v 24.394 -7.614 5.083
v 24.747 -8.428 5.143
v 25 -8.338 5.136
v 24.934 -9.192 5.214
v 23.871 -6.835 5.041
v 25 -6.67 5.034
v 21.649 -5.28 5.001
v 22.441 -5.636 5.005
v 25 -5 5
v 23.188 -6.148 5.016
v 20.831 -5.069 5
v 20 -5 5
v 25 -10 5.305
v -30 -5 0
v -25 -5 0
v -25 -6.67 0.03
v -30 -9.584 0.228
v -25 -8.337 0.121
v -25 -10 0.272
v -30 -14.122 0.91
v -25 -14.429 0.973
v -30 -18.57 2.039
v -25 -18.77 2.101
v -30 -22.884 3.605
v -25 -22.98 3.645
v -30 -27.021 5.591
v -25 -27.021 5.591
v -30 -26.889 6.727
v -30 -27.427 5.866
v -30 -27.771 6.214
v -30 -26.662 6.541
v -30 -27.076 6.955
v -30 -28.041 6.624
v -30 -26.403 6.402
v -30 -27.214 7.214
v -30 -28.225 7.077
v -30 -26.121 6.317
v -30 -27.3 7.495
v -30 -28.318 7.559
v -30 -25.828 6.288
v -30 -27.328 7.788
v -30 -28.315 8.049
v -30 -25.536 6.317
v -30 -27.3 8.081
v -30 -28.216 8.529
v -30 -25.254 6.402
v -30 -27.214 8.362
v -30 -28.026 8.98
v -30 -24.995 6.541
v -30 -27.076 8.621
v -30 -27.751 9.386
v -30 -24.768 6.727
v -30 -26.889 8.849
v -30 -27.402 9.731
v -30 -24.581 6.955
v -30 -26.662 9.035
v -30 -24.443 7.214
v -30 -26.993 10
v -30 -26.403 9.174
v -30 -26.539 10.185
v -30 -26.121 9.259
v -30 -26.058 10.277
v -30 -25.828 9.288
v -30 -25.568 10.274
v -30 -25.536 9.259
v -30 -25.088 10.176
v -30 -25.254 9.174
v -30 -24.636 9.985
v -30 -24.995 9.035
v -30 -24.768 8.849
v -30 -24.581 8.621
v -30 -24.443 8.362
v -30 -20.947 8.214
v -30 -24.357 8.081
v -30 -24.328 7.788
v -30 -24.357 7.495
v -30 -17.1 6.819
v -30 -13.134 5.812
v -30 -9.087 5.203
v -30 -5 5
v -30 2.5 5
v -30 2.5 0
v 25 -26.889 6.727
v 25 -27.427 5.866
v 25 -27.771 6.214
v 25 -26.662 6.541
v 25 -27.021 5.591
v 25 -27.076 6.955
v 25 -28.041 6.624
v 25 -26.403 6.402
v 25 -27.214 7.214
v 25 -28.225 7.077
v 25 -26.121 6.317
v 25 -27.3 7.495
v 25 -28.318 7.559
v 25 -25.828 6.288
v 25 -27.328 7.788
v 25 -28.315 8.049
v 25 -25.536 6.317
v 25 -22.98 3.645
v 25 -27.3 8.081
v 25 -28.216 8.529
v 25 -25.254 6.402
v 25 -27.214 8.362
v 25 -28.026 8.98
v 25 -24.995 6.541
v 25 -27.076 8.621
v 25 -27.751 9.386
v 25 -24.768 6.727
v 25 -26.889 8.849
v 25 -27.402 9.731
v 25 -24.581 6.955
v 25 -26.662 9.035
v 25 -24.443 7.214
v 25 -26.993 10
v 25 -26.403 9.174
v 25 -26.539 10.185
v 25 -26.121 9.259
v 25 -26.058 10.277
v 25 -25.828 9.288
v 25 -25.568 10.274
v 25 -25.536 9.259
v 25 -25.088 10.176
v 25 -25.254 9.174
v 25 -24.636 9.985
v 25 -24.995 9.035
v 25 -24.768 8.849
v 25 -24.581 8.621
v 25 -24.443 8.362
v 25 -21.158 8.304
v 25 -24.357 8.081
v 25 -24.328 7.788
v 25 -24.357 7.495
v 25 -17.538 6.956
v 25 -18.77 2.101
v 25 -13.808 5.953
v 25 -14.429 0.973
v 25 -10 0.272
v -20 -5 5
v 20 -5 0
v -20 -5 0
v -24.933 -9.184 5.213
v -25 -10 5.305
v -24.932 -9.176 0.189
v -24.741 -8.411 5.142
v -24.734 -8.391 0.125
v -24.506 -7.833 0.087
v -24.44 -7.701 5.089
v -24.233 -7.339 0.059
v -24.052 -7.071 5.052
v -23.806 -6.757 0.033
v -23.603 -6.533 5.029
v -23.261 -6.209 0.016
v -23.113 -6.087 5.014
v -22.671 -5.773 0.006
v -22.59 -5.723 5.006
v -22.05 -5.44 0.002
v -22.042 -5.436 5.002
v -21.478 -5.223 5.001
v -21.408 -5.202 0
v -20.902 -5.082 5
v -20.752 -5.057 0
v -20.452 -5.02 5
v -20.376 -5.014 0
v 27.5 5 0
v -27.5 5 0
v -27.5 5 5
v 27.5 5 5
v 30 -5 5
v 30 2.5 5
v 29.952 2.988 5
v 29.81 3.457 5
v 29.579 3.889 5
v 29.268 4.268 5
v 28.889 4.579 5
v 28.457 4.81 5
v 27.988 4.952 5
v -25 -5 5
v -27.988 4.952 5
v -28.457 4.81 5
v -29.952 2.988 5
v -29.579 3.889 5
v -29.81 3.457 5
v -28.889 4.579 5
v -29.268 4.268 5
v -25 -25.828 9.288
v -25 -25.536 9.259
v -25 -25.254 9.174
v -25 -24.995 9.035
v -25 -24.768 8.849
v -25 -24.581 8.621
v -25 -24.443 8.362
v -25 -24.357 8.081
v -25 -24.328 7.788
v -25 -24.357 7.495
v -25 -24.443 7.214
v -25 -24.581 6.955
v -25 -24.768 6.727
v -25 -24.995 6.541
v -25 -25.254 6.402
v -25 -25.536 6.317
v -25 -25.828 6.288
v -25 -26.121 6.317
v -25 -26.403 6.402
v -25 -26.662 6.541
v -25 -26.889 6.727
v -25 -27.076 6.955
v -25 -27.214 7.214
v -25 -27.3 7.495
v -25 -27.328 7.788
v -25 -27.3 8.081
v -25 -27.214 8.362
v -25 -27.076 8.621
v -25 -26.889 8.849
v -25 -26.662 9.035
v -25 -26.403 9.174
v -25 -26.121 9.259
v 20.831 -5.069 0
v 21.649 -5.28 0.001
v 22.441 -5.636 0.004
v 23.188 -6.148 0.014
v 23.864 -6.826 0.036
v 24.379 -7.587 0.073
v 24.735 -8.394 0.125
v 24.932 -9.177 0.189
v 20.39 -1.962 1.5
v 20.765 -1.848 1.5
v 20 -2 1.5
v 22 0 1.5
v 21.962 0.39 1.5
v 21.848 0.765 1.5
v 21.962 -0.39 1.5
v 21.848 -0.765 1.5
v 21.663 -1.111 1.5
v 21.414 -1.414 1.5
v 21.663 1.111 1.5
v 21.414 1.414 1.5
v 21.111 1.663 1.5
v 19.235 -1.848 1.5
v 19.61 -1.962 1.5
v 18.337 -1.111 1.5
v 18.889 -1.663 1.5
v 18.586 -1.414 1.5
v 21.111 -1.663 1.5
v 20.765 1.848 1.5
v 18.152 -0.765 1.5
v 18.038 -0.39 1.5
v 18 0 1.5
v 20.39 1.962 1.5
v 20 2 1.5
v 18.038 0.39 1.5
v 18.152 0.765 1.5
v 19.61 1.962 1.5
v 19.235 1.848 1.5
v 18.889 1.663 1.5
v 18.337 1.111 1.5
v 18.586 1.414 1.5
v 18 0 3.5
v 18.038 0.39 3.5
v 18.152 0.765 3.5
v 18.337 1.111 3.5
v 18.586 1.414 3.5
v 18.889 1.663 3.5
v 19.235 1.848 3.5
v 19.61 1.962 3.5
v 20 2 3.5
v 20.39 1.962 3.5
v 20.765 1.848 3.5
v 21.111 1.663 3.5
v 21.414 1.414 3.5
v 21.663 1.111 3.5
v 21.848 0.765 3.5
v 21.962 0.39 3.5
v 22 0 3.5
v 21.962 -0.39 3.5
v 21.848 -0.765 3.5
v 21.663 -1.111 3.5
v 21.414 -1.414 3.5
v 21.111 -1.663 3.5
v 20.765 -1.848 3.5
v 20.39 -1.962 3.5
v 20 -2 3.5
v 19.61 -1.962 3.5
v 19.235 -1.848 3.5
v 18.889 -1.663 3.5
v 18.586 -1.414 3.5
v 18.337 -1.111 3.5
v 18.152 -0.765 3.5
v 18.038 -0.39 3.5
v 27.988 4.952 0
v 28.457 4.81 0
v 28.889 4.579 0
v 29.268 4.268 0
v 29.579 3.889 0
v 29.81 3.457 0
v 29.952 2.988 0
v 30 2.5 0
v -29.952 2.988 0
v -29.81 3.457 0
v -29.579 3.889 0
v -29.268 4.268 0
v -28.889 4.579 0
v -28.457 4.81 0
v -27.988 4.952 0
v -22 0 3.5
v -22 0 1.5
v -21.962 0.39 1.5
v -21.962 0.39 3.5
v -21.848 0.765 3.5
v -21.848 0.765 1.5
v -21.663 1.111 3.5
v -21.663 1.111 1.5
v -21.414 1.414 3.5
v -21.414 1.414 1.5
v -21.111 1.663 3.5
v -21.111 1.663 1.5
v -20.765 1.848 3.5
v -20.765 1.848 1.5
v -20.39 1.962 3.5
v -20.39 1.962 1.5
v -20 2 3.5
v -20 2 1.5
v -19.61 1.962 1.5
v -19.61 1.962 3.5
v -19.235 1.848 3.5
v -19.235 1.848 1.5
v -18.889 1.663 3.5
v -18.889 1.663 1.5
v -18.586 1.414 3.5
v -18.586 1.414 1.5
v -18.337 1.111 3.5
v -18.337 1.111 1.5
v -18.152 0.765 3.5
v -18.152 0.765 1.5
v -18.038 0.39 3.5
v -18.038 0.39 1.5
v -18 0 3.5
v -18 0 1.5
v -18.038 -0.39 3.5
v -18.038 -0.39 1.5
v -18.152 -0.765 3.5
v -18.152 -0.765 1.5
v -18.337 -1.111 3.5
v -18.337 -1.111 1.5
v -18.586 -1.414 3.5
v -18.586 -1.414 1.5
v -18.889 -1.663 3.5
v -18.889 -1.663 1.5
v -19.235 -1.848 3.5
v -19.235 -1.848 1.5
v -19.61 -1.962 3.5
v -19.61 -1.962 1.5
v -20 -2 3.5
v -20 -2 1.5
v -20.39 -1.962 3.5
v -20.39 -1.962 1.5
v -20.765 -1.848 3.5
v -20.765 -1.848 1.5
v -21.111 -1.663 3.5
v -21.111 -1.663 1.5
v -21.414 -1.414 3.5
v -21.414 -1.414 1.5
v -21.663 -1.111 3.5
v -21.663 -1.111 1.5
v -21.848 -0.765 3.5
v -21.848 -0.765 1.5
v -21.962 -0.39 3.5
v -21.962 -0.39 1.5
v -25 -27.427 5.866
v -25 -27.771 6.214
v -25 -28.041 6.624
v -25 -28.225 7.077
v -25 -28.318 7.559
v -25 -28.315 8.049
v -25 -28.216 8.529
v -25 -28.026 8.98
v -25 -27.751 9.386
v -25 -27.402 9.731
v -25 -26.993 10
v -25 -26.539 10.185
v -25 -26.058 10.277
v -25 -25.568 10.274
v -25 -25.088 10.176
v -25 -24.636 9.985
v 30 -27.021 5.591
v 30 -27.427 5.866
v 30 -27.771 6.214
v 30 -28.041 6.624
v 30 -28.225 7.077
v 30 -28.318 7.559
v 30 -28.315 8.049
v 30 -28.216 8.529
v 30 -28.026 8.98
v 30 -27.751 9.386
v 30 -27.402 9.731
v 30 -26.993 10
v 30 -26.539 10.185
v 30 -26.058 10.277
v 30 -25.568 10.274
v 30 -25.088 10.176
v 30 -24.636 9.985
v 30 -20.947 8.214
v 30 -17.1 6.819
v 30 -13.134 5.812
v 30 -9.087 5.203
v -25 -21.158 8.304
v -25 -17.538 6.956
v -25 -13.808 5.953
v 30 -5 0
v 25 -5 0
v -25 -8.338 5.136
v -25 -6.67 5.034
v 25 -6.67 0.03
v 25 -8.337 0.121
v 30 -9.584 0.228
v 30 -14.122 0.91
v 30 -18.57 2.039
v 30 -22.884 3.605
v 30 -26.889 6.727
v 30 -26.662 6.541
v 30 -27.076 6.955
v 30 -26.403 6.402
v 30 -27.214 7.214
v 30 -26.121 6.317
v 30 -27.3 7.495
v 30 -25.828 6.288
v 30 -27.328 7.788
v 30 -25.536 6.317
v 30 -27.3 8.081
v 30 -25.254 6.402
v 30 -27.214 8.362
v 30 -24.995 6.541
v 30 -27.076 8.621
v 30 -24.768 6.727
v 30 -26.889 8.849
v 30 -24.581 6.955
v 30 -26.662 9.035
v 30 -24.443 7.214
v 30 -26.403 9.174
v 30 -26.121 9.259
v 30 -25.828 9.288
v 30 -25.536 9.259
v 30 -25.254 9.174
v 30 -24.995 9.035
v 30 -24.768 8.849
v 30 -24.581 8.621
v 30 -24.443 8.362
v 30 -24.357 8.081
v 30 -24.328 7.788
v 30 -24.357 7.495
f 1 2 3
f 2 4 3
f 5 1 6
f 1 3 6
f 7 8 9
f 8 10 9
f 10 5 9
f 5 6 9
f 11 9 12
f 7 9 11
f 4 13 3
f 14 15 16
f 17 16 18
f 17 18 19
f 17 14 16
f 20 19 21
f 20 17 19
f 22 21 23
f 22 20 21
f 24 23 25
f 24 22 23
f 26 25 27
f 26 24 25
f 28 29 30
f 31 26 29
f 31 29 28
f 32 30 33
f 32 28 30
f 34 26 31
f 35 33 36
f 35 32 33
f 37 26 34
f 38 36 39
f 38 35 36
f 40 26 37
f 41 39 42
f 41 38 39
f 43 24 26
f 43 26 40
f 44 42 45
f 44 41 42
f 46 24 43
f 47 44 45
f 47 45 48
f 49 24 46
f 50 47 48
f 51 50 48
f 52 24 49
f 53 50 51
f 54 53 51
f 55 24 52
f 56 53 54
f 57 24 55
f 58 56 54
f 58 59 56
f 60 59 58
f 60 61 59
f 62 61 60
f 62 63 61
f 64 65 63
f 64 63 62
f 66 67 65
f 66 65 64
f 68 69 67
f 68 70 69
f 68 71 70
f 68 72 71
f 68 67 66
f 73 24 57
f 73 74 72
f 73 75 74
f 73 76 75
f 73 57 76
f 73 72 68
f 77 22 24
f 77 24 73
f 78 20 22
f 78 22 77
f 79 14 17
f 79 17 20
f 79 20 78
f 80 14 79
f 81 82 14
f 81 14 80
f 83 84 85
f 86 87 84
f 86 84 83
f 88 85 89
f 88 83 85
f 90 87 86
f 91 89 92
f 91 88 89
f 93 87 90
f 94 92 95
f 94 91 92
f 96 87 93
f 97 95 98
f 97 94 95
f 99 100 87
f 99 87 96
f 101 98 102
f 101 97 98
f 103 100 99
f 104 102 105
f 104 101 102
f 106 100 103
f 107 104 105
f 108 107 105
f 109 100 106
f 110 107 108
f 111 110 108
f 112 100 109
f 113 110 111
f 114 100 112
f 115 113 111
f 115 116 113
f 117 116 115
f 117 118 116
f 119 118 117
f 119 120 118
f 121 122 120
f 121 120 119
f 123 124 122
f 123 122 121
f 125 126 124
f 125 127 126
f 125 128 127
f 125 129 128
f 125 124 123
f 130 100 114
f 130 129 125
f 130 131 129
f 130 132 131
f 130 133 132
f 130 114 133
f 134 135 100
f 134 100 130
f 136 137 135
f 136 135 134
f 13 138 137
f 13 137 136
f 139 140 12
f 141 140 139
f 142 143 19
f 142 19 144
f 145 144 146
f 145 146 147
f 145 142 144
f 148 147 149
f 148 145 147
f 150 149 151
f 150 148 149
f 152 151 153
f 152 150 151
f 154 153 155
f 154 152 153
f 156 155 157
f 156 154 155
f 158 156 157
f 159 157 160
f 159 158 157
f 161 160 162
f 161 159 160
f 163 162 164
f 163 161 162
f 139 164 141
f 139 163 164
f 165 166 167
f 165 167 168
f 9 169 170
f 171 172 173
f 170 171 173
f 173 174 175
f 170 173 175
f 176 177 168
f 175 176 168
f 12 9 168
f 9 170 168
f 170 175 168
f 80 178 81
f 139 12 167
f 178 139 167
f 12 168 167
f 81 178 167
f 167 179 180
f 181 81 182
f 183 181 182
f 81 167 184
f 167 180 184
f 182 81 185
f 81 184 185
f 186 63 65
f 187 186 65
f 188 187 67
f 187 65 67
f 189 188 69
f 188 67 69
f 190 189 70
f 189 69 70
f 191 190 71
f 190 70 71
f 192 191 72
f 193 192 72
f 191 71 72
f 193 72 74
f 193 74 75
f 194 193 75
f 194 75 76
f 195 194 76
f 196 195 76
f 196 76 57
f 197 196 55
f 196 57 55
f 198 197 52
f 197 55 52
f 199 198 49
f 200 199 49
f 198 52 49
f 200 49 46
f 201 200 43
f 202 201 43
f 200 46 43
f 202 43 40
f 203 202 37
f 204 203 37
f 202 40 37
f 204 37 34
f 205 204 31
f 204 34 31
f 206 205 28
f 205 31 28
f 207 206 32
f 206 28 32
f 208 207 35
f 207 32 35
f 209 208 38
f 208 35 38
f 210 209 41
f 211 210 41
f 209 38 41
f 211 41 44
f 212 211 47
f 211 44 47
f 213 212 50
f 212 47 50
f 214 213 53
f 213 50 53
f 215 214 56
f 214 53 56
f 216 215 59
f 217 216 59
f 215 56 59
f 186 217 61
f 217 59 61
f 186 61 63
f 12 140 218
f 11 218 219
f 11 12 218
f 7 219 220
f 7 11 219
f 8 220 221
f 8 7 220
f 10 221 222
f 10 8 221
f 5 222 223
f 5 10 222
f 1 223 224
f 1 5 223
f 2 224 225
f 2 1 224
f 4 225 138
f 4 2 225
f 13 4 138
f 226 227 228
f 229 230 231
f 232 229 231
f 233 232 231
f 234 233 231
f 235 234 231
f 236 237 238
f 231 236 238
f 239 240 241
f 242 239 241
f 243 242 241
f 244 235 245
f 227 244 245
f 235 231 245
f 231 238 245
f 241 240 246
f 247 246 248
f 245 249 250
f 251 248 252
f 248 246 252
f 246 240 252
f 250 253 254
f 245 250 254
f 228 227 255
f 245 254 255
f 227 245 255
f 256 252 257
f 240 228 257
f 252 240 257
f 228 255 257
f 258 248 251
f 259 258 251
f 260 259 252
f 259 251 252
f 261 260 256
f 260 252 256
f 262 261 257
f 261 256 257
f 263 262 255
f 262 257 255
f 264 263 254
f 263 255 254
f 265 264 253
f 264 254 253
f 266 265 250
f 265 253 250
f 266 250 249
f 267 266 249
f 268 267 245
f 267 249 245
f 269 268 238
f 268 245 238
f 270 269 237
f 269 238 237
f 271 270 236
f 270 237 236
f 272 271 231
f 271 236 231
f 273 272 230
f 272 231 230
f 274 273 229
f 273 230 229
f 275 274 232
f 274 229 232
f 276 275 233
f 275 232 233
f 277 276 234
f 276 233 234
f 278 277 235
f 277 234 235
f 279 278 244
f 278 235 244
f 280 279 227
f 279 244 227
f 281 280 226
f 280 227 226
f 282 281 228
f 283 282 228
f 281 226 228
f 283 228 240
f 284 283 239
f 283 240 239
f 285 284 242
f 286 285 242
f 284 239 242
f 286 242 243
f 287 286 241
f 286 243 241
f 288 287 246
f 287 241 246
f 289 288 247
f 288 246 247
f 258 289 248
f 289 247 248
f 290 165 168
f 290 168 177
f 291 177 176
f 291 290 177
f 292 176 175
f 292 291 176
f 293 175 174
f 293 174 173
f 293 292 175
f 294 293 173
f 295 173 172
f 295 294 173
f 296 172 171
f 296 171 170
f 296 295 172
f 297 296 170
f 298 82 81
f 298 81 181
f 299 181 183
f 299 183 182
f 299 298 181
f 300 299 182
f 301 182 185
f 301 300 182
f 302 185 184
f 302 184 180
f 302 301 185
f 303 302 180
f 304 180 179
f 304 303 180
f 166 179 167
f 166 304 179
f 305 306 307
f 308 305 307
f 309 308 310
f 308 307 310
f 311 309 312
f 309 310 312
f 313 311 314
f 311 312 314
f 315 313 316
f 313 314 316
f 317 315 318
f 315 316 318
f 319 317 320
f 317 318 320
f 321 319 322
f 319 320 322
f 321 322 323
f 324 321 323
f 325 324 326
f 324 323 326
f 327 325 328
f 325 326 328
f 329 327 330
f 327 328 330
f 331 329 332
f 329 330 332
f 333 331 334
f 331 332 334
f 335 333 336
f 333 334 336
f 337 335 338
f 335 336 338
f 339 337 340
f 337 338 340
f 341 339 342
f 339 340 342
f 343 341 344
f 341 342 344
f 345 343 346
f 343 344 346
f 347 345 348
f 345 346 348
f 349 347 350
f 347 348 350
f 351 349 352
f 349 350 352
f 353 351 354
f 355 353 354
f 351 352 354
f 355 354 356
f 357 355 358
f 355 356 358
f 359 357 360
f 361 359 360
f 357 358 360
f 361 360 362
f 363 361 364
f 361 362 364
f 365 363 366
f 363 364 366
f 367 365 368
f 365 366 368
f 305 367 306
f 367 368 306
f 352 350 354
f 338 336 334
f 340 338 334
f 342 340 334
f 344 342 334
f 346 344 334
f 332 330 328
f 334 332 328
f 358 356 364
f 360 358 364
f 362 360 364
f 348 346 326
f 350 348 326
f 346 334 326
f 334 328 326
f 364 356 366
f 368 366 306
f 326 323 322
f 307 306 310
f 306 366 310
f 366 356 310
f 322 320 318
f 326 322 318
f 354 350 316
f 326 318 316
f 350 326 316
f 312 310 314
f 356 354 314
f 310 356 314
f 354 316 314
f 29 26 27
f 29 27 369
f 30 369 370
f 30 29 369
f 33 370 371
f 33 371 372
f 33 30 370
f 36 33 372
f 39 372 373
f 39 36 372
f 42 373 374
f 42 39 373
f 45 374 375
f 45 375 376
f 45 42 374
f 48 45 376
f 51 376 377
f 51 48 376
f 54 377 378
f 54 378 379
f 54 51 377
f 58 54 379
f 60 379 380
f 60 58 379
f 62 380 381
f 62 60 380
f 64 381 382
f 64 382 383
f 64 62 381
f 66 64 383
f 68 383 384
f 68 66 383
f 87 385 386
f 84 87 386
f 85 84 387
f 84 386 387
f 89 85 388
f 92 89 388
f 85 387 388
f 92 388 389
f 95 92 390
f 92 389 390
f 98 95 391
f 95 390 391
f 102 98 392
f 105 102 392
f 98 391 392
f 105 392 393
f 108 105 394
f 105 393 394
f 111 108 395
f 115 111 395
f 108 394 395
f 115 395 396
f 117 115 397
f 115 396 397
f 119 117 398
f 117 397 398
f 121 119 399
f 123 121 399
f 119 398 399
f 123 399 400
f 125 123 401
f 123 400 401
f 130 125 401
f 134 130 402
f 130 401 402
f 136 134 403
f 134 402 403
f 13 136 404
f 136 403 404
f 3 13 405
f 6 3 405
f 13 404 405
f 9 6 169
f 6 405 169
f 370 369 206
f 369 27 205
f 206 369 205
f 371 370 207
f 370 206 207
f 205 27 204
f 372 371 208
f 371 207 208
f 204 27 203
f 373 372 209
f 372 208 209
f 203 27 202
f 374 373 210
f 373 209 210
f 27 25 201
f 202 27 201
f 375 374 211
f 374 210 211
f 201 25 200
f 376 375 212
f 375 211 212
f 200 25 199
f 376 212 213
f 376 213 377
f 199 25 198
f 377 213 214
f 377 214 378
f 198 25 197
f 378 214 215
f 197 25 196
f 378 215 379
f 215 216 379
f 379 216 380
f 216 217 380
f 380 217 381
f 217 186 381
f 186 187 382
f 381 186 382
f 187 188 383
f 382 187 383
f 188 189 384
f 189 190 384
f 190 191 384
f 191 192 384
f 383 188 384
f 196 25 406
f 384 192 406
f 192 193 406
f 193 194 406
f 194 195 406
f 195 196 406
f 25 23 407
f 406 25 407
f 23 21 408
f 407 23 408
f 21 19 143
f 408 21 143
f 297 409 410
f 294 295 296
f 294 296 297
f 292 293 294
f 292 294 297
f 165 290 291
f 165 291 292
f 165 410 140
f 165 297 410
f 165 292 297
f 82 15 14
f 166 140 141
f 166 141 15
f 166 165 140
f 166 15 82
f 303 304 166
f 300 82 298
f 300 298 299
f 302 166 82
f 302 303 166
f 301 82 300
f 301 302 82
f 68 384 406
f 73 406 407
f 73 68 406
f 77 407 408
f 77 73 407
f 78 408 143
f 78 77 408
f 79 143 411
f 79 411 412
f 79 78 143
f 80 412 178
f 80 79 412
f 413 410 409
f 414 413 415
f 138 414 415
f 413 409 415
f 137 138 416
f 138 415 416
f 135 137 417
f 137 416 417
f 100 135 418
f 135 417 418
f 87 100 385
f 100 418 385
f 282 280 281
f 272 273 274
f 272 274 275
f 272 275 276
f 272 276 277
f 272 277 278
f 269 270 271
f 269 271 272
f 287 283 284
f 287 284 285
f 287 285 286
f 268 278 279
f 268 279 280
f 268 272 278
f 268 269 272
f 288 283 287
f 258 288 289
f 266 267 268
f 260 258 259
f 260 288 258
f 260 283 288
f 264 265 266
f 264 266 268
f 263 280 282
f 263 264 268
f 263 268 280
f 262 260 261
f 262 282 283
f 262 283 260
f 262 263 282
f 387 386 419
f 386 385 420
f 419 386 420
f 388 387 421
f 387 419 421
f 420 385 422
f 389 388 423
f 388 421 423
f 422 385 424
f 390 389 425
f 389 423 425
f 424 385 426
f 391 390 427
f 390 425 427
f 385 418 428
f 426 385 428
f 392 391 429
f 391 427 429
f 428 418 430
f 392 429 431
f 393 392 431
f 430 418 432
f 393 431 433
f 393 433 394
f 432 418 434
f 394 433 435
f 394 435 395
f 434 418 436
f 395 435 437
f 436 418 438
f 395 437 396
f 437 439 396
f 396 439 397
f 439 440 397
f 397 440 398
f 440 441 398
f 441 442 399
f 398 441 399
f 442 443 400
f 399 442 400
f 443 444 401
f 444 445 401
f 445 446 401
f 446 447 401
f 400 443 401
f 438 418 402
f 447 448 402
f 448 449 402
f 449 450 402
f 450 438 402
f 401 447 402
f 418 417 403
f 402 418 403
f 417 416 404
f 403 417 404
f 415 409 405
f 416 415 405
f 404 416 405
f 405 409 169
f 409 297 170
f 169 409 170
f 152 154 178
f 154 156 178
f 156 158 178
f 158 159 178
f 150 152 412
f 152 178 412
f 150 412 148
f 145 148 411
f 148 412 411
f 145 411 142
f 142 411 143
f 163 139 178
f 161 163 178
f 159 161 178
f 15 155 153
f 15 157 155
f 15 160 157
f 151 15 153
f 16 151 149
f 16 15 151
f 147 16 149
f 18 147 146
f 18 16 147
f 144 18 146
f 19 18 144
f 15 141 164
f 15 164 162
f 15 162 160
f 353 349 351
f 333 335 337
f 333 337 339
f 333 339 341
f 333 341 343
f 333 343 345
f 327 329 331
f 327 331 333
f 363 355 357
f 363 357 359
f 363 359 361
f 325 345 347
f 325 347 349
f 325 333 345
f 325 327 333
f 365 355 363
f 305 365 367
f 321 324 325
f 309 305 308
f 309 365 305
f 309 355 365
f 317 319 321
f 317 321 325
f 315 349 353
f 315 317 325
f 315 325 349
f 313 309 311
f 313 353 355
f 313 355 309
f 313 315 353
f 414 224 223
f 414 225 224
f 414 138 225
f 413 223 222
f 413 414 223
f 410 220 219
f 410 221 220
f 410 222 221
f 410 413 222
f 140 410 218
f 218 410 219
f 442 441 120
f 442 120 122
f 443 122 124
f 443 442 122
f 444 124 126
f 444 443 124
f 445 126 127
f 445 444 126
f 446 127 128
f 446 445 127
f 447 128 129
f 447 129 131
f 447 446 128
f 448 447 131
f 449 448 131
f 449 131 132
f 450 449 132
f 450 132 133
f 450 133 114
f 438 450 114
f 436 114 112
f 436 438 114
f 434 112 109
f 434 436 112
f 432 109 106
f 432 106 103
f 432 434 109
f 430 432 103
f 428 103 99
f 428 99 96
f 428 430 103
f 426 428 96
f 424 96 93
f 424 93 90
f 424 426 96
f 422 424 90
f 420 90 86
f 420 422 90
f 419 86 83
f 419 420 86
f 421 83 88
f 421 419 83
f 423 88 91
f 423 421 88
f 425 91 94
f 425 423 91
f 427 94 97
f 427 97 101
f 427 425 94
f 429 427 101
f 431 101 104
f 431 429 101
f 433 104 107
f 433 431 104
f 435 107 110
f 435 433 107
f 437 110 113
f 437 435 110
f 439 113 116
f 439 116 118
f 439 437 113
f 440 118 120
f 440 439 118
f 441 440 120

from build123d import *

# Parameters (mm, degrees)
BOSS_EXTRU_1_DEPTH      = 5
ESQUISSE3_R             = 1.5
BOSS_EXTRU_2_DEPTH      = 5
CONG_1_R                = 5
ENL_V_START             = -1.5
ESQUISSE4_R             = 2
ENL_V_MAT_EXTRU_1_DEPTH = 2


with BuildPart() as part:
    # Esquisse2 → Boss.-Extru.1 (new body)
    with BuildSketch(Plane.XY):
        with BuildLine():
            Line((-27.5, 5), (27.5, 5))
            ThreePointArc((27.5, 5), (29.267766953, 4.267766953), (30, 2.5))
            Line((30, 2.5), (30, -5))
            Line((30, -5), (-30, -5))
            Line((-30, -5), (-30, 2.5))
            ThreePointArc((-30, 2.5), (-29.267766953, 4.267766953), (-27.5, 5))
        make_face()
    extrude(amount=BOSS_EXTRU_1_DEPTH)

    # Esquisse3 → Boss.-Extru.2 (add)
    with BuildSketch(Plane.ZY.offset(30)):
        with BuildLine():
            ThreePointArc((0, -5), (1.419495531, -16.359810014), (5.590686777, -27.021020765))
            ThreePointArc((5.590686777, -27.021020765), (8.980460201, -28.025727757), (9.985167192, -24.635954333))
            ThreePointArc((9.985167192, -24.635954333), (6.265751924, -15.129444636), (5, -5))
            Line((5, -5), (0, -5))
        make_face()
        with Locations((7.787926985, -25.828487549)):
            Circle(ESQUISSE3_R, mode=Mode.SUBTRACT)
    boss_extru_2 = extrude(amount=-BOSS_EXTRU_2_DEPTH)

    # Symétrie1: Boss.-Extru.2 across plane
    add(boss_extru_2.mirror(Plane(origin=(0, 0, 0), x_dir=(0, 0, 1), z_dir=(1, 0, 0))))

    # Congé1
    # the kernel refuses this fillet: 5 mm, written as the material it adds along each edge
    with BuildSketch(Plane(origin=(-25, -5, 17.5), x_dir=(1, 0, 0), z_dir=(0, 0, -1))) as cong_1_piece_1_section:
        with BuildLine():
            CenterArc((CONG_1_R, CONG_1_R), CONG_1_R, 180, 90)
            Line((0, CONG_1_R), (0, 0))
            Line((0, 0), (CONG_1_R, 0))
        make_face()
    cong_1_piece_1 = extrude(amount=30, mode=Mode.PRIVATE)
    cong_1_piece_1 = cong_1_piece_1 & Plane(origin=(-24.565871858, -5, 46.164376109), x_dir=(0, 0, -1), z_dir=(-1, 0, 0)) * Cylinder(46.164376109, 80, mode=Mode.PRIVATE)
    cong_1_piece_1 = cong_1_piece_1 - Plane(origin=(-24.565871858, -5, 46.164376109), x_dir=(0, -0.4770132864696082, -0.8788960828968709), z_dir=(-1, 0, 0)) * Cylinder(41.164376109, 80, mode=Mode.PRIVATE)
    add(cong_1_piece_1)
    with BuildSketch(Plane(origin=(25, -5, 17.5), x_dir=(-1, 0, 0), z_dir=(0, 0, -1))) as cong_1_piece_2_section:
        with BuildLine():
            CenterArc((CONG_1_R, -CONG_1_R), CONG_1_R, 90, 90)
            Line((0, -CONG_1_R), (0, 0))
            Line((0, 0), (CONG_1_R, 0))
        make_face()
    cong_1_piece_2 = extrude(amount=30, mode=Mode.PRIVATE)
    cong_1_piece_2 = cong_1_piece_2 & Plane(origin=(24.565871858, -5, 46.164376109), x_dir=(0, 0, -1), z_dir=(1, 0, 0)) * Cylinder(46.164376109, 80, mode=Mode.PRIVATE)
    cong_1_piece_2 = cong_1_piece_2 - Plane(origin=(24.565871858, -5, 46.164376109), x_dir=(0, -0.4770132864696082, -0.8788960828968709), z_dir=(1, 0, 0)) * Cylinder(41.164376109, 80, mode=Mode.PRIVATE)
    add(cong_1_piece_2)

    # Esquisse4 → Enlèv. mat.-Extru.1 (cut)
    with BuildSketch(Plane(origin=(0, 0, 0), x_dir=(-1, 0, 0), z_dir=(0, 0, -1)).offset(ENL_V_START)):
        with Locations((-20, 0)):
            Circle(ESQUISSE4_R)
        with Locations((20, 0)):
            Circle(ESQUISSE4_R)
    extrude(amount=-ENL_V_MAT_EXTRU_1_DEPTH, mode=Mode.SUBTRACT)


solid = part.part
